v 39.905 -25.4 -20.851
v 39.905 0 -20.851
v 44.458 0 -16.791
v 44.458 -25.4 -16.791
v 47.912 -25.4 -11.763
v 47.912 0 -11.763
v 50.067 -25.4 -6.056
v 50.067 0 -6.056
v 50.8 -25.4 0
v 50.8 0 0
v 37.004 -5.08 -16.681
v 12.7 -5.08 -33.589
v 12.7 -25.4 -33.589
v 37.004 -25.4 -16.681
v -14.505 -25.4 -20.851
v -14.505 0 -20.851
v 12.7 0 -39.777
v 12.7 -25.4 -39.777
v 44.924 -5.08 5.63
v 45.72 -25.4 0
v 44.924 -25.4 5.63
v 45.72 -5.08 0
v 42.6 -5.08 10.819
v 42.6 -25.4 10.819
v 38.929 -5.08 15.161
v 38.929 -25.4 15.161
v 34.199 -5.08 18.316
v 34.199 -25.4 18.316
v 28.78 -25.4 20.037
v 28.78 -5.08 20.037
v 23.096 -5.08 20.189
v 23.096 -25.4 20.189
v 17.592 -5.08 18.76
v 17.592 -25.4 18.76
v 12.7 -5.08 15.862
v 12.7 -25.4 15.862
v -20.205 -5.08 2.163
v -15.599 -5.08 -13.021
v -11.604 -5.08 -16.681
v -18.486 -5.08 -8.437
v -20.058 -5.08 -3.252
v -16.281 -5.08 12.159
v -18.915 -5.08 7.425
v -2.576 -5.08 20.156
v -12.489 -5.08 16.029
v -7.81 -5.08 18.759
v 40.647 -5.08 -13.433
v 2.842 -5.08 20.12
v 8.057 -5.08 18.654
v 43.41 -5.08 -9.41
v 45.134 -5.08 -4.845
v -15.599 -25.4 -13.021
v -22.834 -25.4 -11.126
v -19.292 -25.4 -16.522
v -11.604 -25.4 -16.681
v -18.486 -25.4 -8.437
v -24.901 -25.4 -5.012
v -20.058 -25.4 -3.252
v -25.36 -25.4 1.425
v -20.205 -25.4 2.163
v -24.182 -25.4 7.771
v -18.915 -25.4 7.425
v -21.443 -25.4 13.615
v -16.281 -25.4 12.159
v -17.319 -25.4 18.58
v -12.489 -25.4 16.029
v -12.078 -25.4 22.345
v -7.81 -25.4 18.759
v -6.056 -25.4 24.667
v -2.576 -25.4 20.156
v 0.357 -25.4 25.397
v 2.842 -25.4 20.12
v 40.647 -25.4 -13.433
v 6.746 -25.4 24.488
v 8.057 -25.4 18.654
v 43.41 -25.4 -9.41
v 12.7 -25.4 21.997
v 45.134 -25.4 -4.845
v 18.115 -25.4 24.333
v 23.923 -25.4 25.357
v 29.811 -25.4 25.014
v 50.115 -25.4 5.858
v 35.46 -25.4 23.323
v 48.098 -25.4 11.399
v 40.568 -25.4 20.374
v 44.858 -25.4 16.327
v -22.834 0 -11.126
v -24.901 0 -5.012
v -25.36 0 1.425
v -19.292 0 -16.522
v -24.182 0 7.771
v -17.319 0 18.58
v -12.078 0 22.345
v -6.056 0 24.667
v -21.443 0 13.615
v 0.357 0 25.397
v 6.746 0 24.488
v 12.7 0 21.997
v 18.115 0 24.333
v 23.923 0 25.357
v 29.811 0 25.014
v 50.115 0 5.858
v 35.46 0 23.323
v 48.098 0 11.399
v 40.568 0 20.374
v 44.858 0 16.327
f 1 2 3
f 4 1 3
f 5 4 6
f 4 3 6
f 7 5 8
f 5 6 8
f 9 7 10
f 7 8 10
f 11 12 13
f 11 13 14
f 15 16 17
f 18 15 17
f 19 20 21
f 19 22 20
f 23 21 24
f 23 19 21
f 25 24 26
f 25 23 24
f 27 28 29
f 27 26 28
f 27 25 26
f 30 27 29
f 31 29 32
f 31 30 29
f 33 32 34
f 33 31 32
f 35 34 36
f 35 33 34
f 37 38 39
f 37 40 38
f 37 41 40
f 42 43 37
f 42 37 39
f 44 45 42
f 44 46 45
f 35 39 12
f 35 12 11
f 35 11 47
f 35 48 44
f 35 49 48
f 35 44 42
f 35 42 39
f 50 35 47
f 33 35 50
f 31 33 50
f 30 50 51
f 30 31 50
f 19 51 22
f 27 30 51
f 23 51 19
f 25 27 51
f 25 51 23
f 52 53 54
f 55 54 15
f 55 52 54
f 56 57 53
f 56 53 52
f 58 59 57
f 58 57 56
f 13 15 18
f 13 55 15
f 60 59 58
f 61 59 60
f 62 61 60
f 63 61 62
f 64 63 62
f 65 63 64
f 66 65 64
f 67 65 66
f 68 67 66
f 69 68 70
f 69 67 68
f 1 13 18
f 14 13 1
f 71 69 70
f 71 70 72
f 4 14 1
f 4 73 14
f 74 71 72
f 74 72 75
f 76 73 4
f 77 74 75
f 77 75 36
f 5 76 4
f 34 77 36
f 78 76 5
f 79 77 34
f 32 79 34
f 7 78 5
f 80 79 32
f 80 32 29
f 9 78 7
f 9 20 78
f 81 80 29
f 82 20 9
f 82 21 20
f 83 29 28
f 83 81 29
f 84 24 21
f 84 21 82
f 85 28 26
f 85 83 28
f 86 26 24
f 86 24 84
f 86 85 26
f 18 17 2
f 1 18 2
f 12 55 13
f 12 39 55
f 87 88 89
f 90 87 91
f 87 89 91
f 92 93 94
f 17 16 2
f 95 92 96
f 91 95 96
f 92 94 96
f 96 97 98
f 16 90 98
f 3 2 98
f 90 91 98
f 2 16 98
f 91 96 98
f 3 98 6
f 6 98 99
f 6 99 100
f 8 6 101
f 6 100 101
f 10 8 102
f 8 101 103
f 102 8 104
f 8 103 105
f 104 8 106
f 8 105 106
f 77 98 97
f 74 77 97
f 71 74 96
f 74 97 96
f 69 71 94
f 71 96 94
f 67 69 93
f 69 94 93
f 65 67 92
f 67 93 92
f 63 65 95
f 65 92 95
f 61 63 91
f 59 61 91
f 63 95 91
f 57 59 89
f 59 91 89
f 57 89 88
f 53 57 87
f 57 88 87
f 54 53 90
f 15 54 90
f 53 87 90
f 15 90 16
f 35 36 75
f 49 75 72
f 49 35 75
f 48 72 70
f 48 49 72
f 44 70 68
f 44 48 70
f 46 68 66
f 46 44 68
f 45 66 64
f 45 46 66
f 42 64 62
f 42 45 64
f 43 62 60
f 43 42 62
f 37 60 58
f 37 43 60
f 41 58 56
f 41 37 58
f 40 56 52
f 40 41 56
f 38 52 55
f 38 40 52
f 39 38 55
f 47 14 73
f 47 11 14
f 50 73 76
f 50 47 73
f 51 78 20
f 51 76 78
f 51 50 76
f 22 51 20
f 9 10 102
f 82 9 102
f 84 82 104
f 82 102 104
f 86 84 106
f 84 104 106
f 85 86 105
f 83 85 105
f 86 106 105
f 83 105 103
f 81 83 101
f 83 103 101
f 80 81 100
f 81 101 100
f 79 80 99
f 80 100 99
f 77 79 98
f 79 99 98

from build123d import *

# Parameters (mm, degrees)
F1_DEPTH = 19.05
F2_DEPTH = 25.4
F3_T     = -5.08


# Not quite as in the source:
# - a feature names something its author has since deleted; it is built from what else it names


with BuildPart() as f1:
    # F0 (on Front) → F1 (new body)
    with BuildSketch(Plane.XZ):
        with BuildLine():
            ThreePointArc((12.7, 21.9970452561), (-21.4428837855, 13.6147983812), (-14.5054559874, -20.8507013455))
            ThreePointArc((-14.5054559874, -20.8507013455), (-1.0693193728, -25.3774812793), (12.7, -21.9970452561))
            ThreePointArc((12.7, -21.9970452561), (0, 0), (12.7, 21.9970452561))
        make_face()
    extrude(amount=F1_DEPTH)

    # F0 (on Front) → F2 (join)
    with BuildSketch(Plane.XZ):
        with BuildLine():
            ThreePointArc((12.7, 21.9970452561), (-21.4428837855, 13.6147983812), (-14.5054559874, -20.8507013455))
            ThreePointArc((-14.5054559874, -20.8507013455), (-1.0693193728, -25.3774812793), (12.7, -21.9970452561))
            ThreePointArc((12.7, -21.9970452561), (0, 0), (12.7, 21.9970452561))
        make_face()
        with BuildLine():
            ThreePointArc((12.7, -21.9970452561), (-1.0693193728, -25.3774812793), (-14.5054559874, -20.8507013455))
            Line((-14.5054559874, -20.8507013455), (12.7, -39.7770452561))
            Line((12.7, -39.7770452561), (12.7, -21.9970452561))
        make_face()
        with BuildLine():
            ThreePointArc((12.7, 21.9970452561), (0, 0), (12.7, -21.9970452561))
            ThreePointArc((12.7, -21.9970452561), (21.9970452561, -12.7), (25.4, 0))
            ThreePointArc((25.4, 0), (21.9970452561, 12.7), (12.7, 21.9970452561))
        make_face()
        with BuildLine():
            ThreePointArc((25.4, 0), (21.9970452561, -12.7), (12.7, -21.9970452561))
            ThreePointArc((12.7, -21.9970452561), (26.4693193728, -25.3774812793), (39.9054559874, -20.8507013455))
            ThreePointArc((39.9054559874, -20.8507013455), (47.9122031583, -11.762682898), (50.8, 0))
            ThreePointArc((50.8, 0), (38.1, 21.9970452561), (12.7, 21.9970452561))
            ThreePointArc((12.7, 21.9970452561), (21.9970452561, 12.7), (25.4, 0))
        make_face()
        with BuildLine():
            ThreePointArc((39.9054559874, -20.8507013455), (26.4693193728, -25.3774812793), (12.7, -21.9970452561))
            Line((12.7, -21.9970452561), (12.7, -39.7770452561))
            Line((12.7, -39.7770452561), (39.9054559874, -20.8507013455))
        make_face()
    extrude(amount=F2_DEPTH)

    # F3
    f3_openings = [f1.faces().sort_by_distance(p)[0] for p in [
        (12.7, -25.4, -2.767667),
    ]]
    offset(amount=F3_T, openings=f3_openings, kind=Kind.INTERSECTION)


solid = f1.part
